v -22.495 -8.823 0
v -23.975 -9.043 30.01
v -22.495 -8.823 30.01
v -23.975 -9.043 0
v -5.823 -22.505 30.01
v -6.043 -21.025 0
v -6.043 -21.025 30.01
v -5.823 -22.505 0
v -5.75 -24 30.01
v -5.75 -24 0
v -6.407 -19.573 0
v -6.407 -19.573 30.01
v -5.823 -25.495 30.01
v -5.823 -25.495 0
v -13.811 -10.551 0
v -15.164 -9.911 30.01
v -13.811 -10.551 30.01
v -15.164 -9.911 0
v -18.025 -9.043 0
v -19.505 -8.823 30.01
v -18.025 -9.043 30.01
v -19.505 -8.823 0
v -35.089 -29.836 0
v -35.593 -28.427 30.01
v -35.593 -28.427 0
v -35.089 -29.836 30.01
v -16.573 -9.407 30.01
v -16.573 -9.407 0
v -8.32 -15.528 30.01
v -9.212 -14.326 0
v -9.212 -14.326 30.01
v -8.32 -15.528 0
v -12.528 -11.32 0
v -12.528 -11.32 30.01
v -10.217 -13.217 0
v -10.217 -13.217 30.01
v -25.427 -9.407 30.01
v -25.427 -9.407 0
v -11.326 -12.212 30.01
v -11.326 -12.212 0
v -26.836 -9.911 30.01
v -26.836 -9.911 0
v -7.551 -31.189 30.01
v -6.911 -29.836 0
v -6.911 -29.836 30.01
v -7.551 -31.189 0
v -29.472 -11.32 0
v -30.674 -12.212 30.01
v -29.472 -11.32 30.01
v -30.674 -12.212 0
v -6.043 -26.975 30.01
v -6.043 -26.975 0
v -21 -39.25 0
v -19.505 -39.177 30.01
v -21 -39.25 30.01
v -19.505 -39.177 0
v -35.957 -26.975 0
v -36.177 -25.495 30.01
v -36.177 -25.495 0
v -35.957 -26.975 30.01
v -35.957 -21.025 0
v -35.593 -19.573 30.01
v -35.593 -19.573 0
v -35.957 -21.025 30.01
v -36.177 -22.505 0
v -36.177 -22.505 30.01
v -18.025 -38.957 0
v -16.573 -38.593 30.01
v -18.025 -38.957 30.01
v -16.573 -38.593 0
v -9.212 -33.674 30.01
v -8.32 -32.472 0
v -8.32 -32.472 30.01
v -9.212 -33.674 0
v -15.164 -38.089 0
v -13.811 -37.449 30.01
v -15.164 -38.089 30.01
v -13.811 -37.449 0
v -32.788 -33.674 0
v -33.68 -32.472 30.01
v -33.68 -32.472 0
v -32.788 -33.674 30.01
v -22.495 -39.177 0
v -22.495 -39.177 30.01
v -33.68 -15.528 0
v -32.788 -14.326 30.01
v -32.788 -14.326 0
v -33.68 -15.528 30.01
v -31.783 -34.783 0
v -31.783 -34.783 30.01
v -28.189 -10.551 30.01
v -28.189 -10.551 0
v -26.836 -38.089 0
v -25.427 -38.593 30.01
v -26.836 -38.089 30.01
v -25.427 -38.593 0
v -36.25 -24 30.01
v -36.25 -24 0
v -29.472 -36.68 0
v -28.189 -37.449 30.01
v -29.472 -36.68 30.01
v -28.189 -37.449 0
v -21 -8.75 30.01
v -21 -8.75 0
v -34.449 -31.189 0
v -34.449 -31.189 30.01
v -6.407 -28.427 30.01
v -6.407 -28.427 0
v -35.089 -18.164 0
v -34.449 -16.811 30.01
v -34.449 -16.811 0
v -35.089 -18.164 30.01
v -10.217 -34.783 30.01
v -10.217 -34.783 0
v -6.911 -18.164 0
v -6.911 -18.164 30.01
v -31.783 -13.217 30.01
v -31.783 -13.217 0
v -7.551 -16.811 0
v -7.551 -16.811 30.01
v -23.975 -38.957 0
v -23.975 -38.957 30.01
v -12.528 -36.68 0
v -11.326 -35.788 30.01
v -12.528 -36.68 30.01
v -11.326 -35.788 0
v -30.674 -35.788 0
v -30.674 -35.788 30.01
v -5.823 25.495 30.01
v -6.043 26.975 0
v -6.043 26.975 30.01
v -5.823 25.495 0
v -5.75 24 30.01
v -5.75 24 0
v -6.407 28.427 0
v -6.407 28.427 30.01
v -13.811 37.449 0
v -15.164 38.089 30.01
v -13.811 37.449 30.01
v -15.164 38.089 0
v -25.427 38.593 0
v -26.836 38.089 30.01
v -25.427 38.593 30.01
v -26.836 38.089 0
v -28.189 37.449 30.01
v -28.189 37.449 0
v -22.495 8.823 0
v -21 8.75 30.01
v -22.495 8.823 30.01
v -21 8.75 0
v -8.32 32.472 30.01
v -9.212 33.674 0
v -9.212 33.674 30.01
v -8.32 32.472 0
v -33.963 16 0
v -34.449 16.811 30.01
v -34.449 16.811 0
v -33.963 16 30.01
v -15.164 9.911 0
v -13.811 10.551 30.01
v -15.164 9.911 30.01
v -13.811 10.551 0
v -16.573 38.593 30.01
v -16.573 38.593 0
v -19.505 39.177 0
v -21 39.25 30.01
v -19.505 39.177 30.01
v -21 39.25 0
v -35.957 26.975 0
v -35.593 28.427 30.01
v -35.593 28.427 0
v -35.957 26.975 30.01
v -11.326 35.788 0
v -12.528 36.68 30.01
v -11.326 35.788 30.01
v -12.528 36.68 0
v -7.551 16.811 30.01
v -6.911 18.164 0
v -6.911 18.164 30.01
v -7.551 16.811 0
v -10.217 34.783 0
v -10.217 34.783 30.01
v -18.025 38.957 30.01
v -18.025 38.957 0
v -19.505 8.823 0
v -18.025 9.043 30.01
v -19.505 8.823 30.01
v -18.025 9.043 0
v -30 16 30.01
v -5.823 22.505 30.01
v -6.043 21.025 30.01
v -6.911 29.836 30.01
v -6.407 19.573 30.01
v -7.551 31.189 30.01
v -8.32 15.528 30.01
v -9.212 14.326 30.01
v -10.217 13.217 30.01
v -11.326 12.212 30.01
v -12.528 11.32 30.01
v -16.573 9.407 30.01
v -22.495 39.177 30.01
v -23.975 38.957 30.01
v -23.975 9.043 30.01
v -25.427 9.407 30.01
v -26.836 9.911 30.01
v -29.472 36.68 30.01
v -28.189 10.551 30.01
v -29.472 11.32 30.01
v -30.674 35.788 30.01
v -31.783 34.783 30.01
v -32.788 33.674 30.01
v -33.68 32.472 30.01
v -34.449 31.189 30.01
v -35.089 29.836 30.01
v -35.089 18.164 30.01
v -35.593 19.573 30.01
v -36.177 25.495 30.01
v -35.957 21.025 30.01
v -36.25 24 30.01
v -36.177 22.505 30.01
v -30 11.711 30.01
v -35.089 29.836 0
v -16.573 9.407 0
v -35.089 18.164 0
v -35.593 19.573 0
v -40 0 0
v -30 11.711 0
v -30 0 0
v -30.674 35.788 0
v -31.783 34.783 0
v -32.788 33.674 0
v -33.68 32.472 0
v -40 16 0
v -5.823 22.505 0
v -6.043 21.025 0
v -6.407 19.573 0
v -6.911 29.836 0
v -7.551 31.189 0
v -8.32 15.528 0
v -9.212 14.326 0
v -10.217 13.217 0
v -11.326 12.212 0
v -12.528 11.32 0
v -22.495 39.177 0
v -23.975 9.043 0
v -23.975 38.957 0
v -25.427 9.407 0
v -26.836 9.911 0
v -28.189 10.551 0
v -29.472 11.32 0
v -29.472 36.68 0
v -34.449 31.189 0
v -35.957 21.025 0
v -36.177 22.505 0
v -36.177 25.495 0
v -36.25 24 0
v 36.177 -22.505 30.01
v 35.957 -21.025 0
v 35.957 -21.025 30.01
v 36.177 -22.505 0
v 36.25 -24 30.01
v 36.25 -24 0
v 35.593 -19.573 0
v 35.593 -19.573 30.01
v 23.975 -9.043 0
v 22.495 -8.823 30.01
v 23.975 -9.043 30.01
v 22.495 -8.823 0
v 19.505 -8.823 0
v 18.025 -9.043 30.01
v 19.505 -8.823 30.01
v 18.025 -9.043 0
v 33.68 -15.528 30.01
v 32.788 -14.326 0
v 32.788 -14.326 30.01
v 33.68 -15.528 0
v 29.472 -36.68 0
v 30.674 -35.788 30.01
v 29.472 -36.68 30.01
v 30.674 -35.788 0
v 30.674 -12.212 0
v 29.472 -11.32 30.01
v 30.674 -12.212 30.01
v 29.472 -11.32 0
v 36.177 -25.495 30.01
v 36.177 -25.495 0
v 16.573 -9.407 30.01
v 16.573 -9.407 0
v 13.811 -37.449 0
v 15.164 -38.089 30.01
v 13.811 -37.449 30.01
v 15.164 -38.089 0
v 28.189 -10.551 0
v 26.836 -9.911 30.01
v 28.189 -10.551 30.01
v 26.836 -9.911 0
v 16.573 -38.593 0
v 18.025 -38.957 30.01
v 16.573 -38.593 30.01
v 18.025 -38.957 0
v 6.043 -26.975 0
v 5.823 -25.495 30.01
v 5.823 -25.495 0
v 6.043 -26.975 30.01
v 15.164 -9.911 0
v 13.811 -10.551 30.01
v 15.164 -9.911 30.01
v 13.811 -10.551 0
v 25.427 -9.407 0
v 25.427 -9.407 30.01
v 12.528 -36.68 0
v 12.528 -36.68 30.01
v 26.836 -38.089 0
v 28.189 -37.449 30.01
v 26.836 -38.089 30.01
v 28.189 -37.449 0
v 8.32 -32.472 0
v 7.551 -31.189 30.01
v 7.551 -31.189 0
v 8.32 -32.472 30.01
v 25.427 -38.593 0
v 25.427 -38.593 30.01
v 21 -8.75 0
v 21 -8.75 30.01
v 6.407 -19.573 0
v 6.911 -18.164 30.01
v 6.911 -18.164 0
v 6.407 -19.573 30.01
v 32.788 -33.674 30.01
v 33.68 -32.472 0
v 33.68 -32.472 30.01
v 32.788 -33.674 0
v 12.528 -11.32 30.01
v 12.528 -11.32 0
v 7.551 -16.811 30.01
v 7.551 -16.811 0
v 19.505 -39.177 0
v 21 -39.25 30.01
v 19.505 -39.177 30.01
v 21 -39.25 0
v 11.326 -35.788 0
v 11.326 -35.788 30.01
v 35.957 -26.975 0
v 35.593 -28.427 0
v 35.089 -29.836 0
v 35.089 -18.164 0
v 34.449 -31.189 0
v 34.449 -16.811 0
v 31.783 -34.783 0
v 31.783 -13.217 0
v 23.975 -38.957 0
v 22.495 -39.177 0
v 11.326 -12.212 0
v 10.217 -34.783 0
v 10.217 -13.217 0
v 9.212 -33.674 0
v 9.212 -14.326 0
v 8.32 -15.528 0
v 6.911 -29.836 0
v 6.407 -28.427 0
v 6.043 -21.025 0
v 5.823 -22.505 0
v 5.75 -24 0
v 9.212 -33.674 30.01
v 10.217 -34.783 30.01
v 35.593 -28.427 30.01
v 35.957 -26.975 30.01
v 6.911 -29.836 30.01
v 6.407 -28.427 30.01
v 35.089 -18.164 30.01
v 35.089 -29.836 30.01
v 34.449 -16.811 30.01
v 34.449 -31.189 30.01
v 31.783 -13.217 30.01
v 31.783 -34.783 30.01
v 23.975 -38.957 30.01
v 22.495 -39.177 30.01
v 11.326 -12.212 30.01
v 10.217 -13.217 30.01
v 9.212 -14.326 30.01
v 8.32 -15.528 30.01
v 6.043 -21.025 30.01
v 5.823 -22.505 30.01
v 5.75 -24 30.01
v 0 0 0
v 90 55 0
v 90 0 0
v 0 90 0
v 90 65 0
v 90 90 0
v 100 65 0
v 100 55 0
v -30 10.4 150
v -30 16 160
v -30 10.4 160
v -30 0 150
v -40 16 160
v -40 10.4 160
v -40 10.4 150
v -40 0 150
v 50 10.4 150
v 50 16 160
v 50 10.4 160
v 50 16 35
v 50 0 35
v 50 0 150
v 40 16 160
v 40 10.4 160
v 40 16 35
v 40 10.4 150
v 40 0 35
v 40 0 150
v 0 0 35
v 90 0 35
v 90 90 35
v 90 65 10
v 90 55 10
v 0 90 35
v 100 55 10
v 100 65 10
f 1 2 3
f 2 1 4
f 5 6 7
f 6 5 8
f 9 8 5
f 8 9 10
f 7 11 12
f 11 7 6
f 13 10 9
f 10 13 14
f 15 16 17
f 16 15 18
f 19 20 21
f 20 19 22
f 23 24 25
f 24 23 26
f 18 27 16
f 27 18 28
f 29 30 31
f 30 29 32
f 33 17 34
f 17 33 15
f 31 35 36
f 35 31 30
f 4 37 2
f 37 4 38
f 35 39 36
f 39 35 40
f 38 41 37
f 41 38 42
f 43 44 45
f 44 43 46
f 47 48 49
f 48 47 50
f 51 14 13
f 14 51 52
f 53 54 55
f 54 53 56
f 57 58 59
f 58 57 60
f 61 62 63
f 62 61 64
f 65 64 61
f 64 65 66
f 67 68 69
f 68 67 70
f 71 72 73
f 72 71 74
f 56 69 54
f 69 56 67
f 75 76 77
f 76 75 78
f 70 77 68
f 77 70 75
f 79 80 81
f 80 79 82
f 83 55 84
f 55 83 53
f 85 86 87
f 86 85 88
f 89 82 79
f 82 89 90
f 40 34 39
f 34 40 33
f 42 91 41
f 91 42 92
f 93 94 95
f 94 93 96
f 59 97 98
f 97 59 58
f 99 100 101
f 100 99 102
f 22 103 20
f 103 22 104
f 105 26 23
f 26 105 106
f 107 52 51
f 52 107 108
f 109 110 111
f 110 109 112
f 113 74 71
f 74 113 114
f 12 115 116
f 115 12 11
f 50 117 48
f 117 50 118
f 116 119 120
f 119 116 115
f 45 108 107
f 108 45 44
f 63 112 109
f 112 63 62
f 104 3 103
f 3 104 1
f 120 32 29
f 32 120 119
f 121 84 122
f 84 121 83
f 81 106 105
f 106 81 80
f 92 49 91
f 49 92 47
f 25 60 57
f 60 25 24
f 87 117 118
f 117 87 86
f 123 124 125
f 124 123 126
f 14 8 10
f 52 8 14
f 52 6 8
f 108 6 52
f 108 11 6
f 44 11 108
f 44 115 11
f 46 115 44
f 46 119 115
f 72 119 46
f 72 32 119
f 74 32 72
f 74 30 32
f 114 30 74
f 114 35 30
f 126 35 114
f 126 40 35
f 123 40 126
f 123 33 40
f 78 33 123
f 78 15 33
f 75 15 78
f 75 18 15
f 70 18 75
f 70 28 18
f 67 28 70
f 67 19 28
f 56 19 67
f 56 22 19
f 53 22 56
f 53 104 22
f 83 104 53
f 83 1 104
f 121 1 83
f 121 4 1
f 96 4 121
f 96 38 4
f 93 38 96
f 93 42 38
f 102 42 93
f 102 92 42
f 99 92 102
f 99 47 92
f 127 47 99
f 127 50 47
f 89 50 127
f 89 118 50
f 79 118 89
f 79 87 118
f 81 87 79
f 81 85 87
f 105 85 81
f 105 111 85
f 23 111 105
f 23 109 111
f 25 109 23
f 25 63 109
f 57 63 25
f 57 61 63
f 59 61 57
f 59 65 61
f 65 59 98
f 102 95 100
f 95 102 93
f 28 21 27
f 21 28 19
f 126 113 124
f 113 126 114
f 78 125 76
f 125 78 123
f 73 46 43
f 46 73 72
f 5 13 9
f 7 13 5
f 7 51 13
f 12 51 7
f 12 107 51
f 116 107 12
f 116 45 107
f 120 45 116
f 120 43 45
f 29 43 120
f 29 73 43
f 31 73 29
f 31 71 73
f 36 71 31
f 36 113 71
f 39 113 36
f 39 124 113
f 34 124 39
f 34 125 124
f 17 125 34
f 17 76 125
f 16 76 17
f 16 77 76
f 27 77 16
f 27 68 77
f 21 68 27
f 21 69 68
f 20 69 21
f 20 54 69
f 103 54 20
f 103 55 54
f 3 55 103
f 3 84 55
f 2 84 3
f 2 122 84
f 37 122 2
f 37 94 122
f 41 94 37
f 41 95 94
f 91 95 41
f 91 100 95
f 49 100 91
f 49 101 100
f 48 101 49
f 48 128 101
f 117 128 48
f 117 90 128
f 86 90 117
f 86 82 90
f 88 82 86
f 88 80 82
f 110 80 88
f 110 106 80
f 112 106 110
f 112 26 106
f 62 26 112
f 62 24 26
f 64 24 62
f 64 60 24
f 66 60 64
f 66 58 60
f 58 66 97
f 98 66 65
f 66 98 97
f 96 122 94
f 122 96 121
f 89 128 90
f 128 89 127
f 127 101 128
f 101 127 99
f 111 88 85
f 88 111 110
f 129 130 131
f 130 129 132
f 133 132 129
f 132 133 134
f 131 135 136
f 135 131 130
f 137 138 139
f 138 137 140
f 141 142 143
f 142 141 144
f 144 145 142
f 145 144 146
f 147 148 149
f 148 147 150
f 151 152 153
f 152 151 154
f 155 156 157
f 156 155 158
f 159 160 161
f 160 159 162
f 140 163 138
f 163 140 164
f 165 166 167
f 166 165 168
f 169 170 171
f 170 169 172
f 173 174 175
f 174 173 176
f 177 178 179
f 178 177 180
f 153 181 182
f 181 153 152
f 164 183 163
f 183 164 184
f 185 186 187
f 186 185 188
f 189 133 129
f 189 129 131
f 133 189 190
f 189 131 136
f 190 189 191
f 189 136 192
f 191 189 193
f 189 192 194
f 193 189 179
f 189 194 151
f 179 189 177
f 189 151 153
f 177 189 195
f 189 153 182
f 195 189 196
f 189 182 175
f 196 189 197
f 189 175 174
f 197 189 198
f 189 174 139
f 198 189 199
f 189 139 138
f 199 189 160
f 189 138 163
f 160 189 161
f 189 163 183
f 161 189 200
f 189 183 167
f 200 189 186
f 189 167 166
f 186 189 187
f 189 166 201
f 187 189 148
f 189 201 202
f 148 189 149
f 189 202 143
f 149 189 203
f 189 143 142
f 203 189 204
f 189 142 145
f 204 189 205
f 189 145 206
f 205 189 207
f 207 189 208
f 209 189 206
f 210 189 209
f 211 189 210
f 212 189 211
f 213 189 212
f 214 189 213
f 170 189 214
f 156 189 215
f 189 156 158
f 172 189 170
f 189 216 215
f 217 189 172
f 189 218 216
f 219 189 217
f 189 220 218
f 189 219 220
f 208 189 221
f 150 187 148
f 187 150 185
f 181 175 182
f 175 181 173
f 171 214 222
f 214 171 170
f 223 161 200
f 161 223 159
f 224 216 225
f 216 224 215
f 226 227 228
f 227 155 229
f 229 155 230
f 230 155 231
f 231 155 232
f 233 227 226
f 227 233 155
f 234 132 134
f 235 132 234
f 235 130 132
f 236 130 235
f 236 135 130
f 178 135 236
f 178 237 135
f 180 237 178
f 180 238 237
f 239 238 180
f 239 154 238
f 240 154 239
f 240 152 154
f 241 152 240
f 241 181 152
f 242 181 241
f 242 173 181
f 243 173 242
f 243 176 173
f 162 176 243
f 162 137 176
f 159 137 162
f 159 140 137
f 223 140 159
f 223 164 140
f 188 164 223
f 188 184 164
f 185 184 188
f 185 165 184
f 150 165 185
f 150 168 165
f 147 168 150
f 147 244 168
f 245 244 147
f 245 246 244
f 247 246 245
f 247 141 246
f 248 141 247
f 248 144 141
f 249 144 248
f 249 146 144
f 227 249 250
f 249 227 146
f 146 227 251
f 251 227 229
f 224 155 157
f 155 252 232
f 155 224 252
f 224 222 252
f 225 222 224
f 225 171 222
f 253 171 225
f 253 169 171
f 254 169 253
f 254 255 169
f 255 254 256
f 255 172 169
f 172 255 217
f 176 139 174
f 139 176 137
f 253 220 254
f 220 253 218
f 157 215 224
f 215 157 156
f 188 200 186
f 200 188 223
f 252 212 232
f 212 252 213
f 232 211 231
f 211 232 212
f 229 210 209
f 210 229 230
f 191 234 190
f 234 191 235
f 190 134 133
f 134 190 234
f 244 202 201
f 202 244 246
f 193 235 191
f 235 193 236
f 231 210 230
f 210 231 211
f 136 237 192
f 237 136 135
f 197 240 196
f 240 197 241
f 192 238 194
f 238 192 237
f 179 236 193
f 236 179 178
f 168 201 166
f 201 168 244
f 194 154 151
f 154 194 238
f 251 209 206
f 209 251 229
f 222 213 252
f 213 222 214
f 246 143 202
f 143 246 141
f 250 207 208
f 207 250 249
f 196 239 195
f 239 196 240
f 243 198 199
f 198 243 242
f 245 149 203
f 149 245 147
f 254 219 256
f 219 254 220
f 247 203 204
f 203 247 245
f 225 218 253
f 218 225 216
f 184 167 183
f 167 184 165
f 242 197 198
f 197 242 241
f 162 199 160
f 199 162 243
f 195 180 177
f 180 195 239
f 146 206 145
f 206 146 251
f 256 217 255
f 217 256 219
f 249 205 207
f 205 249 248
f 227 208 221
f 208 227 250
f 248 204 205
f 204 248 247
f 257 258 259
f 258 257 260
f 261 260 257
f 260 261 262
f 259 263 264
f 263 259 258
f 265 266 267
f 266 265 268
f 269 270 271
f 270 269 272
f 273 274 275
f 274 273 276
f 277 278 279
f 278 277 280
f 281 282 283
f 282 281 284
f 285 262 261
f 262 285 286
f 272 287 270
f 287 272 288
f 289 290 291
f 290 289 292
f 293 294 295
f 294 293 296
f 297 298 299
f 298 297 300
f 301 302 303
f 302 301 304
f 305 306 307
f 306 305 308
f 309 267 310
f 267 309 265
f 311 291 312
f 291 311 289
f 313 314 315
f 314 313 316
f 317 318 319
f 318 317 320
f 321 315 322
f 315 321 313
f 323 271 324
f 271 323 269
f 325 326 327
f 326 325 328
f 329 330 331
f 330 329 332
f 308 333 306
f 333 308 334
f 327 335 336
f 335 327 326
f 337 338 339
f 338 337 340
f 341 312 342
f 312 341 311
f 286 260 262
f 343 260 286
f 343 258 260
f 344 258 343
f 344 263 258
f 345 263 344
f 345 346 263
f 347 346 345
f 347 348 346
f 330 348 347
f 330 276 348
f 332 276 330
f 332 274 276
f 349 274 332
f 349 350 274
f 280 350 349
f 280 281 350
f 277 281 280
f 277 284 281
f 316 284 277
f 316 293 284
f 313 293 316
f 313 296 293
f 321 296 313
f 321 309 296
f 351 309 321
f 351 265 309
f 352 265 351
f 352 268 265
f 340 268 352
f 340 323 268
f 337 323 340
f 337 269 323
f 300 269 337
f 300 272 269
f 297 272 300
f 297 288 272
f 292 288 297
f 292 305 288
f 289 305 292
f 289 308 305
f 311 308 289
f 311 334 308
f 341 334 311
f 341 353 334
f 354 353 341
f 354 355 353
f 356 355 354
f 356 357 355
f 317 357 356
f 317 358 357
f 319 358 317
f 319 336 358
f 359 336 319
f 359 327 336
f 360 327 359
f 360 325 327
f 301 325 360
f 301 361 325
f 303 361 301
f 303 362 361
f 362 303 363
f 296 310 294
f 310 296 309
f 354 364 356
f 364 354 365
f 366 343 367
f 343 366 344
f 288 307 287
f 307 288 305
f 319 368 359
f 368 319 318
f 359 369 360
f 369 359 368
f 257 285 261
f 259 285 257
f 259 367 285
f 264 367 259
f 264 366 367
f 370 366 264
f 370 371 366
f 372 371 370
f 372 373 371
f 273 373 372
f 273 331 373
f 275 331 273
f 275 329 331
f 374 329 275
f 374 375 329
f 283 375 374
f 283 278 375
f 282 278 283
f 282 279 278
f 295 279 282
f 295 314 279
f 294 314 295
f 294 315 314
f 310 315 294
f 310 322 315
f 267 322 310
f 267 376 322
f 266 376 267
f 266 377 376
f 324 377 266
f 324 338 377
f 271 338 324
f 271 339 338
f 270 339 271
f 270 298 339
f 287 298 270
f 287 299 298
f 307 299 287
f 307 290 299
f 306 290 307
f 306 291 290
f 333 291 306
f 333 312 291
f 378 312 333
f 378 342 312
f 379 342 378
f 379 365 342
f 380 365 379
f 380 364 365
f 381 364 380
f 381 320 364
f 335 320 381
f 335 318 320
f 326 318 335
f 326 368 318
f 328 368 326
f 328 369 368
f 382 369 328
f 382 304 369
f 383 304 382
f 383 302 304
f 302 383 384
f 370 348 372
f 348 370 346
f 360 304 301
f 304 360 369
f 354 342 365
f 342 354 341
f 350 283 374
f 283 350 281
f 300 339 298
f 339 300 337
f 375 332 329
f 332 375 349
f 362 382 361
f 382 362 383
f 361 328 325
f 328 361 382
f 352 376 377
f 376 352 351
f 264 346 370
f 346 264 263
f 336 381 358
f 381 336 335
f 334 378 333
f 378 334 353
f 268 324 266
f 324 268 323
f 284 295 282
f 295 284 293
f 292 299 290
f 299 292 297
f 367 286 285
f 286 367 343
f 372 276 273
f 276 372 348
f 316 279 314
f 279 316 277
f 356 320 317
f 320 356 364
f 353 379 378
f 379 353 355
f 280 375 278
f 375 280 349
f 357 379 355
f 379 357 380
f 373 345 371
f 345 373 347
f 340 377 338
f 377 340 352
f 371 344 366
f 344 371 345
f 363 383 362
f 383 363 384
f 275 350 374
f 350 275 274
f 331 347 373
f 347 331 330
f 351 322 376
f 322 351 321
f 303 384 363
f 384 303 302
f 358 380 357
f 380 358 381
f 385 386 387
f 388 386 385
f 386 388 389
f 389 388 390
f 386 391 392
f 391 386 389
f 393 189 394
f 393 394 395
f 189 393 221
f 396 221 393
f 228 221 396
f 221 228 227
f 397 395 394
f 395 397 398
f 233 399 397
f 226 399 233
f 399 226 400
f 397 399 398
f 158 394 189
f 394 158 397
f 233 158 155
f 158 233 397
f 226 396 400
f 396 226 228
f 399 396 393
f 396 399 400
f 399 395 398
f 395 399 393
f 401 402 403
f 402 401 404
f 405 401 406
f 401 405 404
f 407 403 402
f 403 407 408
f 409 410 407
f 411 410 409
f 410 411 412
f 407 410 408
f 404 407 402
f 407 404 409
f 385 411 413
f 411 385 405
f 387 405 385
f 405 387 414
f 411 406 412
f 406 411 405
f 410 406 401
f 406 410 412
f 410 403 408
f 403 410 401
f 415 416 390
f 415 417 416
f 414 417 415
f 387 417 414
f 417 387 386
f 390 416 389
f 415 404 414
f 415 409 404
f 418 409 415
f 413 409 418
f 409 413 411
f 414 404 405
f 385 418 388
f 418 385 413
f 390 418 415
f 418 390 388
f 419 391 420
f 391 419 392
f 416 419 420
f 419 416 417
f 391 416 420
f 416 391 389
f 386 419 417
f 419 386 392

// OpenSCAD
$fn = 64;

// ---- Part 1: base block ----
base_w   = 90;    // X width
base_d   = 90;    // Y depth
base_h   = 35;    // Z height

// Blind tube seats
seat_d    = 30.5; // diameter
seat_depth = 30;  // depth (5 mm floor)
seat_x    = 21;   // +/- X centre
seat_y    = 24;   // +/- Y centre

// ---- Part 1: posts ----
post_x   = 10;    // thickness along X
post_y   = 16;    // width along Y
post_z   = 160;   // top height
hole_x   = 10.4;  // square hole side, along X
hole_y   = 10.4;  // square hole side, along Y
hole_z   = 150;   // hole centre height

// ---- Part 2: handle bar ----
bar_w   = 10;     // X width
bar_d   = 10;     // Y depth
bar_l   = 100;    // length along X
bar_y   = 55;     // bar centre Y (spans 55..65, 10 mm gap from base +Y face at 45)

// ===================== PART 1 =====================
// Base block (centre on origin)
cube([base_w, base_d, base_h], center = [0, 0, base_h/2]);

// Four blind tube seats
for (xx = [-1, 1]) {
    for (yy = [-1, 1]) {
        translate([xx * seat_x, yy * seat_y, 0]) {
            cylinder(d = seat_d, h = seat_depth + 0.01, center = [0, 0, seat_depth/2]);
        }
    }
}

// Two posts at X ends, flush with end faces, centred on y = 0
for (xx = [-1, 1]) {
    translate([xx * (base_w/2 - post_x/2), 0, 0]) {
        difference() {
            cube([post_x, post_y, post_z], center = [0, 0, post_z/2]);
            translate([0, 0, hole_z]) {
                cube([hole_x, hole_y, post_z + 0.01], center = [0, 0, 0]);
            }
        }
    }
}

// ===================== PART 2: handle bar =====================
translate([0, bar_y, 0]) {
    cube([bar_l, bar_d, bar_w], center = [0, 0, bar_w/2]);
}
